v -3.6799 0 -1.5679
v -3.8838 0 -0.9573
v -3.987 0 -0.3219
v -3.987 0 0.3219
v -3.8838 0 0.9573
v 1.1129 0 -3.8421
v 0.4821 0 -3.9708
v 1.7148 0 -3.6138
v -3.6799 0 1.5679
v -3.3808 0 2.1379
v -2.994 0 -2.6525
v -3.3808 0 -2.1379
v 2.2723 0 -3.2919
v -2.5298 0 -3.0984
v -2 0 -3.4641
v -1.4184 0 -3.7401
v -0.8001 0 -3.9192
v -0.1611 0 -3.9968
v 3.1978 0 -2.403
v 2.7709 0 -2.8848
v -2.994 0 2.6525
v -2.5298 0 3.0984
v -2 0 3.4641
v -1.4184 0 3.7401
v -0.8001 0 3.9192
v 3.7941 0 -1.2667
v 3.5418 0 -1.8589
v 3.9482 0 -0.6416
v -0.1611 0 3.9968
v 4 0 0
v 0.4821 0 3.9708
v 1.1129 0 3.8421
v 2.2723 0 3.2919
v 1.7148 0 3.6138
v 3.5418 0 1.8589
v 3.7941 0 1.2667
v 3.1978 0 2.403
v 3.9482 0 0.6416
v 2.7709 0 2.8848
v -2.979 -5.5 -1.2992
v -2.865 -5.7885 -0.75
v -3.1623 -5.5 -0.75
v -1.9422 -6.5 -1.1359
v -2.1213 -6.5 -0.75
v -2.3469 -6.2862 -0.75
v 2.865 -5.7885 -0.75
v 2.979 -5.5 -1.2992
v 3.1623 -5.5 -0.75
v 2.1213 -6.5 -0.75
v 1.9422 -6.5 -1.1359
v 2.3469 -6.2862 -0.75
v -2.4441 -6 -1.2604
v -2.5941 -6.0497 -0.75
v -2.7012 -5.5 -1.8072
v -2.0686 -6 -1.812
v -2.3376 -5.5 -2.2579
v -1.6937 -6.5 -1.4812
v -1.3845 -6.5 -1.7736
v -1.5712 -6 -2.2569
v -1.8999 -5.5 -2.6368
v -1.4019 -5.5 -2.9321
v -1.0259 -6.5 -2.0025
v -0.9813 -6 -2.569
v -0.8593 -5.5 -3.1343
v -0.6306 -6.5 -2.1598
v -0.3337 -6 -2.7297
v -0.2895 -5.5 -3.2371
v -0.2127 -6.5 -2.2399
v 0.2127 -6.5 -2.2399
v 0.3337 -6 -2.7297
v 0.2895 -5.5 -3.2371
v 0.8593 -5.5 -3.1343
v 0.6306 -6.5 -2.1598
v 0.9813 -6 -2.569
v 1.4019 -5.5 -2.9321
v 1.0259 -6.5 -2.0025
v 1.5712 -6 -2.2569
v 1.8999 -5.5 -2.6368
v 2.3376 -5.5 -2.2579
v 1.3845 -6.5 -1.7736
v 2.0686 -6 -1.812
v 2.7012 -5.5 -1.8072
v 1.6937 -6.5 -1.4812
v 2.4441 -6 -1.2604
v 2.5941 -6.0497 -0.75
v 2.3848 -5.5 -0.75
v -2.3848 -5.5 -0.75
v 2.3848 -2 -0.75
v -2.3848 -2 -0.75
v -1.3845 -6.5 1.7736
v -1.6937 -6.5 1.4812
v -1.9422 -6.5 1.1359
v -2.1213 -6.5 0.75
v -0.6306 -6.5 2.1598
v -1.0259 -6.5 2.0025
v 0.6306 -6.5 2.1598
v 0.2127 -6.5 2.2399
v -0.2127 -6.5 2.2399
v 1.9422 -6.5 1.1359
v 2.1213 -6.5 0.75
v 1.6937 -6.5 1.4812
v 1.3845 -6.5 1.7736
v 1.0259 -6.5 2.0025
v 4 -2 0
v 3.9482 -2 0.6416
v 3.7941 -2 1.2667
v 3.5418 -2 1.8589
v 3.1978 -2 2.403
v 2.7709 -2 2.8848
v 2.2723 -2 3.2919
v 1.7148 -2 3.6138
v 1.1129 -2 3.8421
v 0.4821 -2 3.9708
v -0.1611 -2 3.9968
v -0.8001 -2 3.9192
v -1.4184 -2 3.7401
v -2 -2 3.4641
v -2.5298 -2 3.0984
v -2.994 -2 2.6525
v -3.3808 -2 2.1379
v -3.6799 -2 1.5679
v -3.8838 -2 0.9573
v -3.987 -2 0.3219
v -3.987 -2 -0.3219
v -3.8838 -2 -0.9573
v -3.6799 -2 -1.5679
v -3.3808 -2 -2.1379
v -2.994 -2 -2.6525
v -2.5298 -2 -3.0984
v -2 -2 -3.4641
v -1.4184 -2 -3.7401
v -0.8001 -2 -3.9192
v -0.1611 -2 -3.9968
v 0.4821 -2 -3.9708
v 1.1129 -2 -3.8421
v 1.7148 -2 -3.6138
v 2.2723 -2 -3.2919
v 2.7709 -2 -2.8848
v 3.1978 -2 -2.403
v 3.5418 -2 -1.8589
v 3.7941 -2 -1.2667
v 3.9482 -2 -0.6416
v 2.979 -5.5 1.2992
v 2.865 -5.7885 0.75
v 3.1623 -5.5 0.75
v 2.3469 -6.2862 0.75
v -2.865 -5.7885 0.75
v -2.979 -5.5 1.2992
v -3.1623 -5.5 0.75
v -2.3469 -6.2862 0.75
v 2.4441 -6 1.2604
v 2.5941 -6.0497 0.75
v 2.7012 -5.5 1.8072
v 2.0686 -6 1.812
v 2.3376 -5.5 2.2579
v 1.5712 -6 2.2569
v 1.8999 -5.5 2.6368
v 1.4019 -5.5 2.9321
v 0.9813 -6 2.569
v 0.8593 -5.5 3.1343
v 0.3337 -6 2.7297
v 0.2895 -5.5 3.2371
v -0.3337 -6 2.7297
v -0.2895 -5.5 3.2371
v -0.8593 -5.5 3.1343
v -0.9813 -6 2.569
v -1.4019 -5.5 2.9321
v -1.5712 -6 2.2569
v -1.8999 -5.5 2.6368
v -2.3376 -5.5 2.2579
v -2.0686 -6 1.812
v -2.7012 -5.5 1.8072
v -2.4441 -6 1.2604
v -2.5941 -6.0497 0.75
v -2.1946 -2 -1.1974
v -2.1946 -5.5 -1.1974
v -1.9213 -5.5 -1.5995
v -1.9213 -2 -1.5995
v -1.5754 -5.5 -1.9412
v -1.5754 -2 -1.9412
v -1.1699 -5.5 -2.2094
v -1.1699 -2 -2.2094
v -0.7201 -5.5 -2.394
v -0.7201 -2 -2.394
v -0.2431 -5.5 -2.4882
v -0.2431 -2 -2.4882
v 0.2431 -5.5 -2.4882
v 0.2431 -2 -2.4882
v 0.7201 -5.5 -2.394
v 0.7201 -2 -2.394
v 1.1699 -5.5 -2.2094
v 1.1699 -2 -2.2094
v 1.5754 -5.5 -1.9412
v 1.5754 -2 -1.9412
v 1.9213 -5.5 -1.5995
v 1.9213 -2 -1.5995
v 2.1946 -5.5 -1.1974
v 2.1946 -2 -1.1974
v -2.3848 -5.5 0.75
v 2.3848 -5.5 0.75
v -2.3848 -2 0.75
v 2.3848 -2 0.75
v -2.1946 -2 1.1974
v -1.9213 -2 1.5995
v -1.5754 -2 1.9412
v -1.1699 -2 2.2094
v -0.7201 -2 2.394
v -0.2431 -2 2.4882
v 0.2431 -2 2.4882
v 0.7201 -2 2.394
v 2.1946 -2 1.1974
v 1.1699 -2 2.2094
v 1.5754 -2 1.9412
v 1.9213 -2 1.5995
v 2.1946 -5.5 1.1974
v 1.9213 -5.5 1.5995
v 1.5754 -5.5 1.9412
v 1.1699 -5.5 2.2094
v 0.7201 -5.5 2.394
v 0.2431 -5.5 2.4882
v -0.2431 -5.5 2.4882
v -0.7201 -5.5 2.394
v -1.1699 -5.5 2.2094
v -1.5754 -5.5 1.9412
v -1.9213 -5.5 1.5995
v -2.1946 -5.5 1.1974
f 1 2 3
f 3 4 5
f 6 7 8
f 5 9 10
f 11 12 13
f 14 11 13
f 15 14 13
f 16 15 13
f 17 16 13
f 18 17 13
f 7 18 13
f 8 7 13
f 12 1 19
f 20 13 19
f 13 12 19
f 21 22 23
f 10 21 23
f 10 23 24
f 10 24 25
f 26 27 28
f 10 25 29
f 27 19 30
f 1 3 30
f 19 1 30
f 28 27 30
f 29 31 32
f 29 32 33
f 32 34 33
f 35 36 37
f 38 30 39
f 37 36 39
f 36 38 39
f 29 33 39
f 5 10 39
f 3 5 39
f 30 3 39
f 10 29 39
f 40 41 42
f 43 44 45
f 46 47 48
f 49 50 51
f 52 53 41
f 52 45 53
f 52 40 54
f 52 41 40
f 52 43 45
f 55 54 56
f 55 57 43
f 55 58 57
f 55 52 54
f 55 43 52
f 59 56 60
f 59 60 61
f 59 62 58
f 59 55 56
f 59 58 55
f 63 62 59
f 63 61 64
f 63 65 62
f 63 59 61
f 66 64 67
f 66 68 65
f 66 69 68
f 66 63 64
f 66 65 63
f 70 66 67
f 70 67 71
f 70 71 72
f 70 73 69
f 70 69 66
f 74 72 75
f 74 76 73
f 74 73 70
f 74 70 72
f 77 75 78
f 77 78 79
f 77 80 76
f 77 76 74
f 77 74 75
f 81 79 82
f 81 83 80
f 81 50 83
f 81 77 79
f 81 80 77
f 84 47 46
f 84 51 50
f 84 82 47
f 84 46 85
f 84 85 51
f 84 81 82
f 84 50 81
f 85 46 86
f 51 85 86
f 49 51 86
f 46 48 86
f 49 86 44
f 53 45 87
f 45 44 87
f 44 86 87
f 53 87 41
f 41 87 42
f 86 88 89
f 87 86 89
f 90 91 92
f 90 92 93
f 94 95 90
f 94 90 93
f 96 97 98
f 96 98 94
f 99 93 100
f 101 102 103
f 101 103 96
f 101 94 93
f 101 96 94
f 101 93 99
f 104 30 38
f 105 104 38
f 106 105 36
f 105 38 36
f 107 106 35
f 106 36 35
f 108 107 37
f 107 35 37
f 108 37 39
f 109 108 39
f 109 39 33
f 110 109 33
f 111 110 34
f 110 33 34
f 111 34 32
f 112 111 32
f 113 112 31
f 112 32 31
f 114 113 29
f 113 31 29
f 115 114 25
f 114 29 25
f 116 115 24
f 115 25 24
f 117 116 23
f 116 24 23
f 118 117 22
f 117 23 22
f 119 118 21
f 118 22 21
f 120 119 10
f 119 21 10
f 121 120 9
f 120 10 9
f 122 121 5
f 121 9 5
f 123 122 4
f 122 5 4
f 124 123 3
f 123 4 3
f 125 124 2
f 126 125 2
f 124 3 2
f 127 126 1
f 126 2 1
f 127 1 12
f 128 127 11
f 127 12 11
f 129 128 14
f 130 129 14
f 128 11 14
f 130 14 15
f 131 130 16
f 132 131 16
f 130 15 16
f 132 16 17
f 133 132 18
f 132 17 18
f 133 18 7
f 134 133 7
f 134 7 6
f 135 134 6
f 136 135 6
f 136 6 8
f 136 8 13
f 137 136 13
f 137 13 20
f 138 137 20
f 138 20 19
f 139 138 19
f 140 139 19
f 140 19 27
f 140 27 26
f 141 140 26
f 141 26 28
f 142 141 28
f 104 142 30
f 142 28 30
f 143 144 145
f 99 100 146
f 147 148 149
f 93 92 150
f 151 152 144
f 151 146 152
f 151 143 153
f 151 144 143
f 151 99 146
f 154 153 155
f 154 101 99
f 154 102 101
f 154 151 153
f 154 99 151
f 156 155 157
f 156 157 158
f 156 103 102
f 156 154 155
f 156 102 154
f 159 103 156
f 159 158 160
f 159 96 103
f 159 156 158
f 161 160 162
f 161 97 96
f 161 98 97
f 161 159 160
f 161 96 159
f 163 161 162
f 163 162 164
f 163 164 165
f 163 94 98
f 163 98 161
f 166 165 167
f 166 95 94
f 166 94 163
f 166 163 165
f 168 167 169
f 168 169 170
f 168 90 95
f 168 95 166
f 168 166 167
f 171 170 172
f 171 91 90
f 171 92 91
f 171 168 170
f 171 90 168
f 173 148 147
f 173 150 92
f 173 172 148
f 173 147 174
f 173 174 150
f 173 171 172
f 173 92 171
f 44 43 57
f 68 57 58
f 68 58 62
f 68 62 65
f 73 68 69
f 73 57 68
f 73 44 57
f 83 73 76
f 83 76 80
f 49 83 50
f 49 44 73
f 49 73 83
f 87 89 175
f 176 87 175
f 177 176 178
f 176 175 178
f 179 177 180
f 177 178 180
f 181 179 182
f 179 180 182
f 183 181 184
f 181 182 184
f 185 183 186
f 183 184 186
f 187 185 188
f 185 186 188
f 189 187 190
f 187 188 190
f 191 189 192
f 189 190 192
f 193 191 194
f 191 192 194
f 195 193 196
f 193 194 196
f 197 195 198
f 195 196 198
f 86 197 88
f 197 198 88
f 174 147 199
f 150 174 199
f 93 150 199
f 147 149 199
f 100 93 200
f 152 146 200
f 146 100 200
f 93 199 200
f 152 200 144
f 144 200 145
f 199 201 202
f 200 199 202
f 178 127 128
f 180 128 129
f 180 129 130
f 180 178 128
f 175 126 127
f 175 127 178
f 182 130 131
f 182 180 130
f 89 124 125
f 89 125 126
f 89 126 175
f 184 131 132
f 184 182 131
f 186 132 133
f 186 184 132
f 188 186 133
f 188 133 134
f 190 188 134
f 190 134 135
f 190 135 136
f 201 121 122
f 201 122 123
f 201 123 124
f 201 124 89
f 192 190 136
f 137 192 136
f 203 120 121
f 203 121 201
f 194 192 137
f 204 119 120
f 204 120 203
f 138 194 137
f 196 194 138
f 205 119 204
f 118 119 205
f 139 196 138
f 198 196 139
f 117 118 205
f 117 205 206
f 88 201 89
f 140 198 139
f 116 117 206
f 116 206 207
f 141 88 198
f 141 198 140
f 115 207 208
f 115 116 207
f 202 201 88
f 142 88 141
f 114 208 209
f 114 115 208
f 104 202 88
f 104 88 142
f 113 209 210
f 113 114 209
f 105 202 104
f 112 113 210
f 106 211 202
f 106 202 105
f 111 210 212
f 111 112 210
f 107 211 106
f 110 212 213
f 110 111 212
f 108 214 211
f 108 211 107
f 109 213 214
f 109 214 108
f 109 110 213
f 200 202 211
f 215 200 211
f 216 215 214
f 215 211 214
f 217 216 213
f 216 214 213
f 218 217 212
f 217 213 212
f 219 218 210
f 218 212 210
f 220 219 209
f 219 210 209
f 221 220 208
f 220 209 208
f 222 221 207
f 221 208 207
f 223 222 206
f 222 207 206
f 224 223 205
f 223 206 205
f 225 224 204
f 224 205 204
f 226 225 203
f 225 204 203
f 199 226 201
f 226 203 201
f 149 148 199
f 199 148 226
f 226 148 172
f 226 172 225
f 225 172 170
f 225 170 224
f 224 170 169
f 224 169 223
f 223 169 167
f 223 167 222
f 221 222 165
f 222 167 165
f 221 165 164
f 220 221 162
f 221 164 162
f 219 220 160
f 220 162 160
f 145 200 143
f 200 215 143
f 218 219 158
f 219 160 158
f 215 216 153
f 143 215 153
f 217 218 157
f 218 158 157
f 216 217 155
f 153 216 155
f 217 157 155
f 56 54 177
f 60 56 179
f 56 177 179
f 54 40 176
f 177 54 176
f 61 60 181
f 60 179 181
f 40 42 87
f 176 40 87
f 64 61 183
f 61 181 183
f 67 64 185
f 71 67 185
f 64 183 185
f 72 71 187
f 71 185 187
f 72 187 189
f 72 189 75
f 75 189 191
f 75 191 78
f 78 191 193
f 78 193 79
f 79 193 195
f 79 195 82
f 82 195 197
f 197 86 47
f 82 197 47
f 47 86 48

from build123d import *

# Parameters (mm, degrees)
F0_R     = 4
F1_DEPTH = 2
F2_DEPTH = 5.5
F3_START = 5.5
F3_DEPTH = 1
F4_SIZE  = 0.99999


# Not quite as in the source:
# - a fillet or chamfer is up to 0.001 mm smaller than in the source, because OpenCascade refuses the exact size


with BuildPart() as f1:
    # F0 (on Front) → F1 (new body)
    with BuildSketch(Plane.XZ):
        Circle(F0_R)
        with BuildLine():
            ThreePointArc((-3.1622776602, 0.75), (0, 3.25), (3.1622776602, 0.75))
            Line((3.1622776602, 0.75), (3.5, 0.75))
            Line((3.5, 0.75), (3.5, -0.75))
            Line((3.5, -0.75), (3.1622776602, -0.75))
            ThreePointArc((3.1622776602, -0.75), (0, -3.25), (-3.1622776602, -0.75))
            Line((-3.1622776602, -0.75), (-3.5, -0.75))
            Line((-3.5, -0.75), (-3.5, 0.75))
            Line((-3.5, 0.75), (-3.1622776602, 0.75))
        make_face(mode=Mode.SUBTRACT)
        with BuildLine():
            ThreePointArc((2.3848480035, -0.75), (2.4710443145, -0.3793942482), (2.5, 0))
            ThreePointArc((2.5, 0), (2.4710443145, 0.3793942482), (2.3848480035, 0.75))
            Line((2.3848480035, 0.75), (-2.3848480035, 0.75))
            ThreePointArc((-2.3848480035, 0.75), (-2.5, 0), (-2.3848480035, -0.75))
            Line((-2.3848480035, -0.75), (2.3848480035, -0.75))
        make_face()
        with BuildLine():
            ThreePointArc((-2.3848480035, -0.75), (0, -2.5), (2.3848480035, -0.75))
            Line((2.3848480035, -0.75), (-2.3848480035, -0.75))
        make_face()
        with BuildLine():
            Line((-2.3848480035, 0.75), (2.3848480035, 0.75))
            ThreePointArc((2.3848480035, 0.75), (0, 2.5), (-2.3848480035, 0.75))
        make_face()
        with BuildLine():
            Line((3.1622776602, -0.75), (2.3848480035, -0.75))
            ThreePointArc((2.3848480035, -0.75), (0, -2.5), (-2.3848480035, -0.75))
            Line((-2.3848480035, -0.75), (-3.1622776602, -0.75))
            ThreePointArc((-3.1622776602, -0.75), (0, -3.25), (3.1622776602, -0.75))
        make_face()
        with BuildLine():
            ThreePointArc((-2.3848480035, 0.75), (0, 2.5), (2.3848480035, 0.75))
            Line((2.3848480035, 0.75), (3.1622776602, 0.75))
            ThreePointArc((3.1622776602, 0.75), (0, 3.25), (-3.1622776602, 0.75))
            Line((-3.1622776602, 0.75), (-2.3848480035, 0.75))
        make_face()
        with BuildLine():
            ThreePointArc((-2.3848480035, -0.75), (-2.5, 0), (-2.3848480035, 0.75))
            Line((-2.3848480035, 0.75), (-3.1622776602, 0.75))
            ThreePointArc((-3.1622776602, 0.75), (-3.25, 0), (-3.1622776602, -0.75))
            Line((-3.1622776602, -0.75), (-2.3848480035, -0.75))
        make_face()
        with BuildLine():
            ThreePointArc((2.3848480035, 0.75), (2.4710443145, 0.3793942482), (2.5, 0))
            ThreePointArc((2.5, 0), (2.4710443145, -0.3793942482), (2.3848480035, -0.75))
            Line((2.3848480035, -0.75), (3.1622776602, -0.75))
            ThreePointArc((3.1622776602, -0.75), (3.2279949191, -0.3775563564), (3.25, 0))
            ThreePointArc((3.25, 0), (3.2279949191, 0.3775563564), (3.1622776602, 0.75))
            Line((3.1622776602, 0.75), (2.3848480035, 0.75))
        make_face()
        with BuildLine():
            Line((3.5, 0.75), (3.1622776602, 0.75))
            ThreePointArc((3.1622776602, 0.75), (3.2279949191, 0.3775563564), (3.25, 0))
            ThreePointArc((3.25, 0), (3.2279949191, -0.3775563564), (3.1622776602, -0.75))
            Line((3.1622776602, -0.75), (3.5, -0.75))
            Line((3.5, -0.75), (3.5, 0.75))
        make_face()
        with BuildLine():
            ThreePointArc((-3.1622776602, -0.75), (-3.25, 0), (-3.1622776602, 0.75))
            Line((-3.1622776602, 0.75), (-3.5, 0.75))
            Line((-3.5, 0.75), (-3.5, -0.75))
            Line((-3.5, -0.75), (-3.1622776602, -0.75))
        make_face()
    extrude(amount=F1_DEPTH)

    # F0 (on Front) → F2 (join)
    with BuildSketch(Plane.XZ):
        with BuildLine():
            Line((-2.3848480035, 0.75), (2.3848480035, 0.75))
            ThreePointArc((2.3848480035, 0.75), (0, 2.5), (-2.3848480035, 0.75))
        make_face()
        with BuildLine():
            ThreePointArc((-2.3848480035, -0.75), (0, -2.5), (2.3848480035, -0.75))
            Line((2.3848480035, -0.75), (-2.3848480035, -0.75))
        make_face()
    extrude(amount=F2_DEPTH)

    # F0 (on Front) → F3 (join)
    with BuildSketch(Plane.XZ.offset(F3_START)):
        with BuildLine():
            Line((3.1622776602, -0.75), (2.3848480035, -0.75))
            ThreePointArc((2.3848480035, -0.75), (0, -2.5), (-2.3848480035, -0.75))
            Line((-2.3848480035, -0.75), (-3.1622776602, -0.75))
            ThreePointArc((-3.1622776602, -0.75), (0, -3.25), (3.1622776602, -0.75))
        make_face()
        with BuildLine():
            ThreePointArc((-2.3848480035, 0.75), (0, 2.5), (2.3848480035, 0.75))
            Line((2.3848480035, 0.75), (3.1622776602, 0.75))
            ThreePointArc((3.1622776602, 0.75), (0, 3.25), (-3.1622776602, 0.75))
            Line((-3.1622776602, 0.75), (-2.3848480035, 0.75))
        make_face()
        with BuildLine():
            Line((-2.3848480035, 0.75), (2.3848480035, 0.75))
            ThreePointArc((2.3848480035, 0.75), (0, 2.5), (-2.3848480035, 0.75))
        make_face()
        with BuildLine():
            ThreePointArc((-2.3848480035, -0.75), (0, -2.5), (2.3848480035, -0.75))
            Line((2.3848480035, -0.75), (-2.3848480035, -0.75))
        make_face()
    extrude(amount=F3_DEPTH)

    # F4 (size 1 in the source; OpenCascade refuses exactly that, so slightly less here)
    f4_edges = [f1.edges().sort_by_distance(p)[0] for p in [
        (0, -6.5, 3.25),
        (0, -6.5, -3.25),
    ]]
    chamfer(f4_edges, length=F4_SIZE)


solid = f1.part
